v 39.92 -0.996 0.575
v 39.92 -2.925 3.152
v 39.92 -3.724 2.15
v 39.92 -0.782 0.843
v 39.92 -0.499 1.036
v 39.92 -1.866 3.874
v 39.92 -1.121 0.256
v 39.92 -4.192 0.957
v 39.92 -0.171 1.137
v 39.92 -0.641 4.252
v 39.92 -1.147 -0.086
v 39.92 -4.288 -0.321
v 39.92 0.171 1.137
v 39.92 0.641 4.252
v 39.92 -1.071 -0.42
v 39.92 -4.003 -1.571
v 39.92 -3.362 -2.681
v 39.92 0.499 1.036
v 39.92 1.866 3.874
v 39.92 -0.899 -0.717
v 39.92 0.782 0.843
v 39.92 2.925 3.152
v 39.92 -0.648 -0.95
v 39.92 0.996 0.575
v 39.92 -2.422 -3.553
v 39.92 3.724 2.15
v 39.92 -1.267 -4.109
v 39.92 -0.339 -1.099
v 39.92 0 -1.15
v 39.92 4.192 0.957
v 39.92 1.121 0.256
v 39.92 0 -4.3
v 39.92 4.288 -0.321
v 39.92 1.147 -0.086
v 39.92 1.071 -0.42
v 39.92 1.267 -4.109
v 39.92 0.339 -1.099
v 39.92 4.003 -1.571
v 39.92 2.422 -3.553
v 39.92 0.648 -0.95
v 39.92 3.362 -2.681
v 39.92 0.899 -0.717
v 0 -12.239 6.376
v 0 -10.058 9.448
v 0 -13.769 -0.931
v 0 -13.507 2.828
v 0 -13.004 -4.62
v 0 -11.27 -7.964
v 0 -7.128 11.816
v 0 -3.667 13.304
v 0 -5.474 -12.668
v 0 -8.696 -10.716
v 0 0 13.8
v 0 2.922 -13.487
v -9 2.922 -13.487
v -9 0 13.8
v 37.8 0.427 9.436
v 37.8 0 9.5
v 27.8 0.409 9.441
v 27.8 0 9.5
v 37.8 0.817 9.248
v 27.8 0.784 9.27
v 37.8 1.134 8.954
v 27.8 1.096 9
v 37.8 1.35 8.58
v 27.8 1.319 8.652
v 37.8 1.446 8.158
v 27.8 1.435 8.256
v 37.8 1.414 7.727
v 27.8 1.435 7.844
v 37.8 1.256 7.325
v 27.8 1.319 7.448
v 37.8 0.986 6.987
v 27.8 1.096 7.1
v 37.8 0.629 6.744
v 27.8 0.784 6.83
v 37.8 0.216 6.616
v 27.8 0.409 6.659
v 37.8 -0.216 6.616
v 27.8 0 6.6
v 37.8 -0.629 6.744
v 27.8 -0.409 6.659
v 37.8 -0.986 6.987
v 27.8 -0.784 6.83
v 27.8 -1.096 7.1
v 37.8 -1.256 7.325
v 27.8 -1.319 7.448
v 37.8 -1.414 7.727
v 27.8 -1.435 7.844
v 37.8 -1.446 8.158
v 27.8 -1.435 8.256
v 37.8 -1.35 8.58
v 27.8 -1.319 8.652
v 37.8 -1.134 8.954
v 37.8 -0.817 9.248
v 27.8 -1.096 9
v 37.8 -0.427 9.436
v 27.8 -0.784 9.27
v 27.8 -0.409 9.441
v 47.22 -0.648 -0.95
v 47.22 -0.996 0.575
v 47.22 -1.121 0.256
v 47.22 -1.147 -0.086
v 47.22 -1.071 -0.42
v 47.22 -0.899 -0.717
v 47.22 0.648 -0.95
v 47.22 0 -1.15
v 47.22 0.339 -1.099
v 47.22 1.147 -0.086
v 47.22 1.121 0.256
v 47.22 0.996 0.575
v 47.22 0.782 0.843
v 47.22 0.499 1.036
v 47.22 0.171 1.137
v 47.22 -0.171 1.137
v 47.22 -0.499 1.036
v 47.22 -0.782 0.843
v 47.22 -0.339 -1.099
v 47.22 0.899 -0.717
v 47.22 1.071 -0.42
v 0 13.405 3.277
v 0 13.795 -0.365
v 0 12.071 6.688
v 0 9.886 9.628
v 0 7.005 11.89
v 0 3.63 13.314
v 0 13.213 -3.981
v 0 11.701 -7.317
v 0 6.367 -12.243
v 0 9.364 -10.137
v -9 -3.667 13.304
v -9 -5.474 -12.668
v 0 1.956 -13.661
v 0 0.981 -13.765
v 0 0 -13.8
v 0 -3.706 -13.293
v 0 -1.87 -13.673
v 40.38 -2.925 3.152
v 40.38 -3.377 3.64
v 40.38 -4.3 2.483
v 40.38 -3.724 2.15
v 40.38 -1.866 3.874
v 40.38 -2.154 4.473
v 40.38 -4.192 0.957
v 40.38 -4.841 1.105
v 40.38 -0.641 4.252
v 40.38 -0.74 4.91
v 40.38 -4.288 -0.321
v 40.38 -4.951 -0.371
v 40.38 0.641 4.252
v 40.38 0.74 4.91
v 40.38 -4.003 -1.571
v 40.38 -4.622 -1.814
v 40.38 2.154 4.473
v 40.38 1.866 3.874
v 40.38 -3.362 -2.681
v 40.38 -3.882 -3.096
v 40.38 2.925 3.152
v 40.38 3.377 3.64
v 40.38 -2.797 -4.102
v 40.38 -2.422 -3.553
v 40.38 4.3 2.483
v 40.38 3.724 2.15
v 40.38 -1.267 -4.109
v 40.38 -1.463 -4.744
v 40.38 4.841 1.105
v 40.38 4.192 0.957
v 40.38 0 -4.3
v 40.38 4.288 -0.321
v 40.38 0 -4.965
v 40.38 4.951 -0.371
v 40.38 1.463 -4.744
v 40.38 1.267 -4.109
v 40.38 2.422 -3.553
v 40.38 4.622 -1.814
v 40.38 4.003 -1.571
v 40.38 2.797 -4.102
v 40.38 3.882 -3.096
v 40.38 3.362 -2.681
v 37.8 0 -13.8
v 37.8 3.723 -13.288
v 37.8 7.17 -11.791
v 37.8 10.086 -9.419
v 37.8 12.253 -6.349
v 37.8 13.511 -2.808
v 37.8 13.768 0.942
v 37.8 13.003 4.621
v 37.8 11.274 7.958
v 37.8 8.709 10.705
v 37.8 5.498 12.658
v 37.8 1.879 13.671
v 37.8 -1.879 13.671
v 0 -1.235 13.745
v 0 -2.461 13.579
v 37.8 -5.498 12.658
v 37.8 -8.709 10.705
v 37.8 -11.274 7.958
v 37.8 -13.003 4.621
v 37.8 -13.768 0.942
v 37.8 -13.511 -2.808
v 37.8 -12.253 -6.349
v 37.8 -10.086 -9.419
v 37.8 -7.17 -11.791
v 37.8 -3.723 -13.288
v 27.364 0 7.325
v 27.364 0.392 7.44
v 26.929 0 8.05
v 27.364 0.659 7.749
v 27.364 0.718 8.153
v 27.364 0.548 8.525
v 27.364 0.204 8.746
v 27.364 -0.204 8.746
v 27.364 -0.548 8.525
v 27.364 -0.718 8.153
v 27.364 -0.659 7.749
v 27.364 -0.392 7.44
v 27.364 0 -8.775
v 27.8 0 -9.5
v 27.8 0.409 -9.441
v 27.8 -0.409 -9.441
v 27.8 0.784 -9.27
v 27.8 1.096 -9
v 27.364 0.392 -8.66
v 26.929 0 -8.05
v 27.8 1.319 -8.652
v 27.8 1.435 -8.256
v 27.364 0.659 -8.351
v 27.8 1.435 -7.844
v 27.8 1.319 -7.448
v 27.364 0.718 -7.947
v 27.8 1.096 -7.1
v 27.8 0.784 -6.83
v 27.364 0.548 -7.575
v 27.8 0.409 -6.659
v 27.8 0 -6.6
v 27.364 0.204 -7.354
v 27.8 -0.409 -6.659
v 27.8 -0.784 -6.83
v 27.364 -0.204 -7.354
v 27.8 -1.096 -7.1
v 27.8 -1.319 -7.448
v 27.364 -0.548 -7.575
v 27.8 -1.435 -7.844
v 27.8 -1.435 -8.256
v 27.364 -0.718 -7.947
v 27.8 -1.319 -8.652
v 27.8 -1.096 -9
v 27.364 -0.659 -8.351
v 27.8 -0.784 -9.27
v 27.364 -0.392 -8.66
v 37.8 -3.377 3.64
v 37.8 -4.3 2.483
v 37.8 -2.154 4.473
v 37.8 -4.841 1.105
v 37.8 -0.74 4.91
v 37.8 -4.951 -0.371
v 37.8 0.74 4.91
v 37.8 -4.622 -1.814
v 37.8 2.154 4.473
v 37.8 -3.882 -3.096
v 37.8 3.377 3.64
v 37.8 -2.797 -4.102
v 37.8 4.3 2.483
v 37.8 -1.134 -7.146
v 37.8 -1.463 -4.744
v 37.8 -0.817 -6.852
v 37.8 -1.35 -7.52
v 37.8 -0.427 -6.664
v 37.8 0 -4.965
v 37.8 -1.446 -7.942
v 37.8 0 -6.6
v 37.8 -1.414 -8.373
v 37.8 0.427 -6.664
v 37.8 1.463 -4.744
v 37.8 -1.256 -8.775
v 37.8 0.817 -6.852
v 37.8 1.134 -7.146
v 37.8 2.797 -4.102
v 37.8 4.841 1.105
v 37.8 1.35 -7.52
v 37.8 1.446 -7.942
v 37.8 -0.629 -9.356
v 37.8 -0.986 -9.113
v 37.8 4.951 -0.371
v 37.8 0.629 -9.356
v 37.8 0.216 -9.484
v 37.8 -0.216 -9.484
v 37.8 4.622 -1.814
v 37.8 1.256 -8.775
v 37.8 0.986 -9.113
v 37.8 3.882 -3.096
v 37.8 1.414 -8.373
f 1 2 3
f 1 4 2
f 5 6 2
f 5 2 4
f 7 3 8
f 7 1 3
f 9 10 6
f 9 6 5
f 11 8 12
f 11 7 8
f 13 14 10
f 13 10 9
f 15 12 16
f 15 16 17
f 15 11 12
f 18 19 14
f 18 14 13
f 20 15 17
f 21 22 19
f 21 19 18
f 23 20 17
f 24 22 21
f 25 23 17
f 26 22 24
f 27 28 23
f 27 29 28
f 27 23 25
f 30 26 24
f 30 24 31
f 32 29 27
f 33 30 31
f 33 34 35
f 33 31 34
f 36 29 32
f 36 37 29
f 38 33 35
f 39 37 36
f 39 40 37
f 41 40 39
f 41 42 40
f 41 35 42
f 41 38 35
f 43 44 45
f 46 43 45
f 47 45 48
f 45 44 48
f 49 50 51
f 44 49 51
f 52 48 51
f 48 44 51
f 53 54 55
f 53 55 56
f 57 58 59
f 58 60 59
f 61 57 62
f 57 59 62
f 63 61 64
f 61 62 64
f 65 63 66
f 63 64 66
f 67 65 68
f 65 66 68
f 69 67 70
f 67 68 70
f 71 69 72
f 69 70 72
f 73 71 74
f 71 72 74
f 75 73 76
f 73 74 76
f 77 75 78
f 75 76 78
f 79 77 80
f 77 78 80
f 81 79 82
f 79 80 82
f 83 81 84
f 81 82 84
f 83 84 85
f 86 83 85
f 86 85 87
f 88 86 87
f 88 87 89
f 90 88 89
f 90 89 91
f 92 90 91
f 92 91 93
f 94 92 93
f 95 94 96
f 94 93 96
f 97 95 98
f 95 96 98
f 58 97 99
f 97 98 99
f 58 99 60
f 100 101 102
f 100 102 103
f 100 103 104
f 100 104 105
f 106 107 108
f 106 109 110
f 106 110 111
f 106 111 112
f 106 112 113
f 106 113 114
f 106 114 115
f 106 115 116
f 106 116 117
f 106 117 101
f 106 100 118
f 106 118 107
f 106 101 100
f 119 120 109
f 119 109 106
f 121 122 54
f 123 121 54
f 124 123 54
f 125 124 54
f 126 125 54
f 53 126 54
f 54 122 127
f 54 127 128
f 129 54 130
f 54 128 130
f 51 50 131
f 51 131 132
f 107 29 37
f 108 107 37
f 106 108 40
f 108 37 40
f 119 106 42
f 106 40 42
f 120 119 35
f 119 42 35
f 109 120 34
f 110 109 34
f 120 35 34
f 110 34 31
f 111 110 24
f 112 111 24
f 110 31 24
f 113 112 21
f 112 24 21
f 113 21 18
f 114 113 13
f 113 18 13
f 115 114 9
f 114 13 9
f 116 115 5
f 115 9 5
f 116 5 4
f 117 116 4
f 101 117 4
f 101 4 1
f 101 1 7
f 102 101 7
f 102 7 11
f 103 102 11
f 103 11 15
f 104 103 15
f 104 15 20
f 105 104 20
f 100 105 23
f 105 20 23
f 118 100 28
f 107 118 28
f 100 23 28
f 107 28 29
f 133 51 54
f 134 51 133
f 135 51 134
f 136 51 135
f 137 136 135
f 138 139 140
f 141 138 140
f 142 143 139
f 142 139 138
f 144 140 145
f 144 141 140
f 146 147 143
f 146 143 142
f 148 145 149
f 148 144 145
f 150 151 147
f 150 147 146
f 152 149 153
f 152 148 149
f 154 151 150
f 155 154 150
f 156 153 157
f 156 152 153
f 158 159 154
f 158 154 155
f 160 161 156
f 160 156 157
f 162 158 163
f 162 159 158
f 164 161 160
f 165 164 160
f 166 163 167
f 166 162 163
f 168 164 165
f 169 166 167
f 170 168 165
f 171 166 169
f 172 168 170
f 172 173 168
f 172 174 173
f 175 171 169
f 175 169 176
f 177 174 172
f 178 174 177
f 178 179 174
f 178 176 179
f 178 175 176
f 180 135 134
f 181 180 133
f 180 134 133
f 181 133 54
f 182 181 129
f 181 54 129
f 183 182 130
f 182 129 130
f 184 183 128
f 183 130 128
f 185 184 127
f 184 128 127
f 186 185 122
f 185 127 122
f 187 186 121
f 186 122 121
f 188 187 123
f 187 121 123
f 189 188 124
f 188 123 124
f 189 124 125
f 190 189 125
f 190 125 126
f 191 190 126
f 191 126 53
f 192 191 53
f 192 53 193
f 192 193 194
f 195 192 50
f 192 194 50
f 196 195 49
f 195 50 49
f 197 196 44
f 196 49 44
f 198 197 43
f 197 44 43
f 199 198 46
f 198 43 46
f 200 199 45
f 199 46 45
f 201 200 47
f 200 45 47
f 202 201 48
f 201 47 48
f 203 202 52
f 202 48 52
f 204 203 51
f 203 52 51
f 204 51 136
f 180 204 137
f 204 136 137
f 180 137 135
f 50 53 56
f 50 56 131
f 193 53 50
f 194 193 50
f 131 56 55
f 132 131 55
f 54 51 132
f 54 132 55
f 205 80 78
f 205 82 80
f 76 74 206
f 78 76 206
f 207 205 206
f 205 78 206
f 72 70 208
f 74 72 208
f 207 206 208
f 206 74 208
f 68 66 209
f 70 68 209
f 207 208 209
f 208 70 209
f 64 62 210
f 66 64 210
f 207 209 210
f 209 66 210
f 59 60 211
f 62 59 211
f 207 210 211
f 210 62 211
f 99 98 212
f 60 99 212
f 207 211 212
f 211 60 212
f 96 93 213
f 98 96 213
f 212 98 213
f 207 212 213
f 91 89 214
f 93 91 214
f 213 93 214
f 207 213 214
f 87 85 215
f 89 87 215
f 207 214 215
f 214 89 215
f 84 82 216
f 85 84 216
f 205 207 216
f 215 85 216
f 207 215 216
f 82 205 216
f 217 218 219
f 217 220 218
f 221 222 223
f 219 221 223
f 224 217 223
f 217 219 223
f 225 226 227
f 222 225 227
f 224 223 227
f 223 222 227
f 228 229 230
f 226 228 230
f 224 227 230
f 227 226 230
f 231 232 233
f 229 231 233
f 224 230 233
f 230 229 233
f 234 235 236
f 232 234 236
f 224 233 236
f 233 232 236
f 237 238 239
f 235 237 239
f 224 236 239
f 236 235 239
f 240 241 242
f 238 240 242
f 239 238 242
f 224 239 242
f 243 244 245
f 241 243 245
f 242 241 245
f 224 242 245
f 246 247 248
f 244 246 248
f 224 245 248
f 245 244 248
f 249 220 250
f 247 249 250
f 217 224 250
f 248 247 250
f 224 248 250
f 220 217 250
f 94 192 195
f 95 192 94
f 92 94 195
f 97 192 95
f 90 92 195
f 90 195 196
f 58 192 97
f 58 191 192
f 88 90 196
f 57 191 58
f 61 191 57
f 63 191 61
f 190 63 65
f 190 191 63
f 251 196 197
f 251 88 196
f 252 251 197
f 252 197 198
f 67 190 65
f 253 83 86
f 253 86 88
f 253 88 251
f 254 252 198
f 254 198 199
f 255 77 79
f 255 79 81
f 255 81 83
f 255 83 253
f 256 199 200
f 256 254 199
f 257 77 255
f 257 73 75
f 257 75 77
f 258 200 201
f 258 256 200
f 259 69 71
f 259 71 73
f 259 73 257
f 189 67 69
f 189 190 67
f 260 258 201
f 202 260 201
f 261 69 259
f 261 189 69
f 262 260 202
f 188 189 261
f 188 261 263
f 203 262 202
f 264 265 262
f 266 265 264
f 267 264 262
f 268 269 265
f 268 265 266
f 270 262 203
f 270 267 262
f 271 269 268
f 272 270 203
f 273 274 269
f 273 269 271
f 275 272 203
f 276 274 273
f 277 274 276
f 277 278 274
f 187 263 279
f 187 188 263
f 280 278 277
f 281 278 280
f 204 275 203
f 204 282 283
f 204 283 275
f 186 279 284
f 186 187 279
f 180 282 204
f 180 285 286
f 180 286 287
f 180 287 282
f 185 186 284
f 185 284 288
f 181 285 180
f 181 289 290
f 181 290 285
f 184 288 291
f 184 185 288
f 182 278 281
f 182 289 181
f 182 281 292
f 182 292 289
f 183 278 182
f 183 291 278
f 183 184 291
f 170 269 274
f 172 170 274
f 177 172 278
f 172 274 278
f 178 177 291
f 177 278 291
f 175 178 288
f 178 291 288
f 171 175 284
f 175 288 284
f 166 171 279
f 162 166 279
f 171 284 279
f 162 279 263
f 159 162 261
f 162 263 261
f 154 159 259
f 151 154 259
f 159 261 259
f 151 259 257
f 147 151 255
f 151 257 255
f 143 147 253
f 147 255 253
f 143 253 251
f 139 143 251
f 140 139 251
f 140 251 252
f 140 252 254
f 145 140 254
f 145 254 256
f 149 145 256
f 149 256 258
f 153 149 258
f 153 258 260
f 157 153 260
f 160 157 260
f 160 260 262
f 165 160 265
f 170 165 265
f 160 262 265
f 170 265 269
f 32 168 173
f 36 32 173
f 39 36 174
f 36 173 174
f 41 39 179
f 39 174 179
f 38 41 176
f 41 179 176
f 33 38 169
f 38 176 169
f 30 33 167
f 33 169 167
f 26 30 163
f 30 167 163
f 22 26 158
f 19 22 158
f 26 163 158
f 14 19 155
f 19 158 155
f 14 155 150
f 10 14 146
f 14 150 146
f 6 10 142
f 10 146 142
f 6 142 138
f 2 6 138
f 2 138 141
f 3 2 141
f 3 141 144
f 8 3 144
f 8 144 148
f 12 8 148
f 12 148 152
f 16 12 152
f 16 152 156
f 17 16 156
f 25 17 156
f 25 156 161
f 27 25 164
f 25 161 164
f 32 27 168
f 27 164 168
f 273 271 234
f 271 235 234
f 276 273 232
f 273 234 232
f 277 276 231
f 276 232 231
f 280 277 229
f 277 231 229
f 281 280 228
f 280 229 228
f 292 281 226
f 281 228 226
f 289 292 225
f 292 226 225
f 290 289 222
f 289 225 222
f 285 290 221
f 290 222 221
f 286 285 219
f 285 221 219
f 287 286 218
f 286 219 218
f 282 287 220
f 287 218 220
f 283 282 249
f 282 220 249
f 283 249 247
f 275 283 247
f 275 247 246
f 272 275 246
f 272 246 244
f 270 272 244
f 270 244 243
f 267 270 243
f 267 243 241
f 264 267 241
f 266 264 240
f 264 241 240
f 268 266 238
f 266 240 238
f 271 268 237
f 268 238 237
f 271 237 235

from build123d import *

# Parameters (mm, degrees)
SKETCH1_R                  = 13.8
BOSS_EXTRUDE1_DEPTH        = 37.8
SKETCH2_R                  = 4.965
BOSS_EXTRUDE2_DEPTH        = 2.58
SKETCH3_R                  = 4.3
CUT_EXTRUDE1_DEPTH         = 0.46
SKETCH4_R                  = 1.15
BOSS_EXTRUDE3_DEPTH        = 7.3
M2_5_CLEARANCE_HOLE1_D     = 2.9
M2_5_CLEARANCE_HOLE1_DEPTH = 10
M2_5_CLEARANCE_HOLE1_TIP   = 0.871247898
BOSS_EXTRUDE4_DEPTH        = 9


with BuildPart() as part:
    # Sketch1 → Boss-Extrude1 (new body)
    with BuildSketch(Plane(origin=(0, 0, 0), x_dir=(0, 0, -1), z_dir=(1, 0, 0))):
        Circle(SKETCH1_R)
    extrude(amount=BOSS_EXTRUDE1_DEPTH)

    # Sketch2 → Boss-Extrude2 (add)
    with BuildSketch(Plane(origin=(37.8, 0, 0), x_dir=(0, 0, -1), z_dir=(1, 0, 0))):
        Circle(SKETCH2_R)
    extrude(amount=BOSS_EXTRUDE2_DEPTH)

    # Sketch3 → Cut-Extrude1 (cut)
    with BuildSketch(Plane(origin=(40.38, 0, 0), x_dir=(0, 0, -1), z_dir=(1, 0, 0))):
        Circle(SKETCH3_R)
    extrude(amount=-CUT_EXTRUDE1_DEPTH, mode=Mode.SUBTRACT)

    # Sketch4 → Boss-Extrude3 (add)
    with BuildSketch(Plane(origin=(39.92, 0, 0), x_dir=(0, 0, -1), z_dir=(1, 0, 0))):
        Circle(SKETCH4_R)
    extrude(amount=BOSS_EXTRUDE3_DEPTH)

    # M2.5 Clearance Hole1
    with Locations(Plane(origin=(37.8, 0, 0), x_dir=(0, 0, -1), z_dir=(1, 0, 0))):
        with Locations((-8.05, 0), (8.05, 0)):
            Hole(M2_5_CLEARANCE_HOLE1_D / 2, depth=M2_5_CLEARANCE_HOLE1_DEPTH)
            with Locations((0, 0, -(M2_5_CLEARANCE_HOLE1_DEPTH + M2_5_CLEARANCE_HOLE1_TIP / 2))):  # 118° drill point
                Cone(0, M2_5_CLEARANCE_HOLE1_D / 2, M2_5_CLEARANCE_HOLE1_TIP, mode=Mode.SUBTRACT)

    # Sketch7 → Boss-Extrude4 (add)
    with BuildSketch(Plane.ZY):
        Polygon((-13.48707523, 2.922122814), (13.8, 0), (13.303912233, -3.666867776), (-12.668048772, -5.47362223), align=None)
    extrude(amount=BOSS_EXTRUDE4_DEPTH)


solid = part.part
